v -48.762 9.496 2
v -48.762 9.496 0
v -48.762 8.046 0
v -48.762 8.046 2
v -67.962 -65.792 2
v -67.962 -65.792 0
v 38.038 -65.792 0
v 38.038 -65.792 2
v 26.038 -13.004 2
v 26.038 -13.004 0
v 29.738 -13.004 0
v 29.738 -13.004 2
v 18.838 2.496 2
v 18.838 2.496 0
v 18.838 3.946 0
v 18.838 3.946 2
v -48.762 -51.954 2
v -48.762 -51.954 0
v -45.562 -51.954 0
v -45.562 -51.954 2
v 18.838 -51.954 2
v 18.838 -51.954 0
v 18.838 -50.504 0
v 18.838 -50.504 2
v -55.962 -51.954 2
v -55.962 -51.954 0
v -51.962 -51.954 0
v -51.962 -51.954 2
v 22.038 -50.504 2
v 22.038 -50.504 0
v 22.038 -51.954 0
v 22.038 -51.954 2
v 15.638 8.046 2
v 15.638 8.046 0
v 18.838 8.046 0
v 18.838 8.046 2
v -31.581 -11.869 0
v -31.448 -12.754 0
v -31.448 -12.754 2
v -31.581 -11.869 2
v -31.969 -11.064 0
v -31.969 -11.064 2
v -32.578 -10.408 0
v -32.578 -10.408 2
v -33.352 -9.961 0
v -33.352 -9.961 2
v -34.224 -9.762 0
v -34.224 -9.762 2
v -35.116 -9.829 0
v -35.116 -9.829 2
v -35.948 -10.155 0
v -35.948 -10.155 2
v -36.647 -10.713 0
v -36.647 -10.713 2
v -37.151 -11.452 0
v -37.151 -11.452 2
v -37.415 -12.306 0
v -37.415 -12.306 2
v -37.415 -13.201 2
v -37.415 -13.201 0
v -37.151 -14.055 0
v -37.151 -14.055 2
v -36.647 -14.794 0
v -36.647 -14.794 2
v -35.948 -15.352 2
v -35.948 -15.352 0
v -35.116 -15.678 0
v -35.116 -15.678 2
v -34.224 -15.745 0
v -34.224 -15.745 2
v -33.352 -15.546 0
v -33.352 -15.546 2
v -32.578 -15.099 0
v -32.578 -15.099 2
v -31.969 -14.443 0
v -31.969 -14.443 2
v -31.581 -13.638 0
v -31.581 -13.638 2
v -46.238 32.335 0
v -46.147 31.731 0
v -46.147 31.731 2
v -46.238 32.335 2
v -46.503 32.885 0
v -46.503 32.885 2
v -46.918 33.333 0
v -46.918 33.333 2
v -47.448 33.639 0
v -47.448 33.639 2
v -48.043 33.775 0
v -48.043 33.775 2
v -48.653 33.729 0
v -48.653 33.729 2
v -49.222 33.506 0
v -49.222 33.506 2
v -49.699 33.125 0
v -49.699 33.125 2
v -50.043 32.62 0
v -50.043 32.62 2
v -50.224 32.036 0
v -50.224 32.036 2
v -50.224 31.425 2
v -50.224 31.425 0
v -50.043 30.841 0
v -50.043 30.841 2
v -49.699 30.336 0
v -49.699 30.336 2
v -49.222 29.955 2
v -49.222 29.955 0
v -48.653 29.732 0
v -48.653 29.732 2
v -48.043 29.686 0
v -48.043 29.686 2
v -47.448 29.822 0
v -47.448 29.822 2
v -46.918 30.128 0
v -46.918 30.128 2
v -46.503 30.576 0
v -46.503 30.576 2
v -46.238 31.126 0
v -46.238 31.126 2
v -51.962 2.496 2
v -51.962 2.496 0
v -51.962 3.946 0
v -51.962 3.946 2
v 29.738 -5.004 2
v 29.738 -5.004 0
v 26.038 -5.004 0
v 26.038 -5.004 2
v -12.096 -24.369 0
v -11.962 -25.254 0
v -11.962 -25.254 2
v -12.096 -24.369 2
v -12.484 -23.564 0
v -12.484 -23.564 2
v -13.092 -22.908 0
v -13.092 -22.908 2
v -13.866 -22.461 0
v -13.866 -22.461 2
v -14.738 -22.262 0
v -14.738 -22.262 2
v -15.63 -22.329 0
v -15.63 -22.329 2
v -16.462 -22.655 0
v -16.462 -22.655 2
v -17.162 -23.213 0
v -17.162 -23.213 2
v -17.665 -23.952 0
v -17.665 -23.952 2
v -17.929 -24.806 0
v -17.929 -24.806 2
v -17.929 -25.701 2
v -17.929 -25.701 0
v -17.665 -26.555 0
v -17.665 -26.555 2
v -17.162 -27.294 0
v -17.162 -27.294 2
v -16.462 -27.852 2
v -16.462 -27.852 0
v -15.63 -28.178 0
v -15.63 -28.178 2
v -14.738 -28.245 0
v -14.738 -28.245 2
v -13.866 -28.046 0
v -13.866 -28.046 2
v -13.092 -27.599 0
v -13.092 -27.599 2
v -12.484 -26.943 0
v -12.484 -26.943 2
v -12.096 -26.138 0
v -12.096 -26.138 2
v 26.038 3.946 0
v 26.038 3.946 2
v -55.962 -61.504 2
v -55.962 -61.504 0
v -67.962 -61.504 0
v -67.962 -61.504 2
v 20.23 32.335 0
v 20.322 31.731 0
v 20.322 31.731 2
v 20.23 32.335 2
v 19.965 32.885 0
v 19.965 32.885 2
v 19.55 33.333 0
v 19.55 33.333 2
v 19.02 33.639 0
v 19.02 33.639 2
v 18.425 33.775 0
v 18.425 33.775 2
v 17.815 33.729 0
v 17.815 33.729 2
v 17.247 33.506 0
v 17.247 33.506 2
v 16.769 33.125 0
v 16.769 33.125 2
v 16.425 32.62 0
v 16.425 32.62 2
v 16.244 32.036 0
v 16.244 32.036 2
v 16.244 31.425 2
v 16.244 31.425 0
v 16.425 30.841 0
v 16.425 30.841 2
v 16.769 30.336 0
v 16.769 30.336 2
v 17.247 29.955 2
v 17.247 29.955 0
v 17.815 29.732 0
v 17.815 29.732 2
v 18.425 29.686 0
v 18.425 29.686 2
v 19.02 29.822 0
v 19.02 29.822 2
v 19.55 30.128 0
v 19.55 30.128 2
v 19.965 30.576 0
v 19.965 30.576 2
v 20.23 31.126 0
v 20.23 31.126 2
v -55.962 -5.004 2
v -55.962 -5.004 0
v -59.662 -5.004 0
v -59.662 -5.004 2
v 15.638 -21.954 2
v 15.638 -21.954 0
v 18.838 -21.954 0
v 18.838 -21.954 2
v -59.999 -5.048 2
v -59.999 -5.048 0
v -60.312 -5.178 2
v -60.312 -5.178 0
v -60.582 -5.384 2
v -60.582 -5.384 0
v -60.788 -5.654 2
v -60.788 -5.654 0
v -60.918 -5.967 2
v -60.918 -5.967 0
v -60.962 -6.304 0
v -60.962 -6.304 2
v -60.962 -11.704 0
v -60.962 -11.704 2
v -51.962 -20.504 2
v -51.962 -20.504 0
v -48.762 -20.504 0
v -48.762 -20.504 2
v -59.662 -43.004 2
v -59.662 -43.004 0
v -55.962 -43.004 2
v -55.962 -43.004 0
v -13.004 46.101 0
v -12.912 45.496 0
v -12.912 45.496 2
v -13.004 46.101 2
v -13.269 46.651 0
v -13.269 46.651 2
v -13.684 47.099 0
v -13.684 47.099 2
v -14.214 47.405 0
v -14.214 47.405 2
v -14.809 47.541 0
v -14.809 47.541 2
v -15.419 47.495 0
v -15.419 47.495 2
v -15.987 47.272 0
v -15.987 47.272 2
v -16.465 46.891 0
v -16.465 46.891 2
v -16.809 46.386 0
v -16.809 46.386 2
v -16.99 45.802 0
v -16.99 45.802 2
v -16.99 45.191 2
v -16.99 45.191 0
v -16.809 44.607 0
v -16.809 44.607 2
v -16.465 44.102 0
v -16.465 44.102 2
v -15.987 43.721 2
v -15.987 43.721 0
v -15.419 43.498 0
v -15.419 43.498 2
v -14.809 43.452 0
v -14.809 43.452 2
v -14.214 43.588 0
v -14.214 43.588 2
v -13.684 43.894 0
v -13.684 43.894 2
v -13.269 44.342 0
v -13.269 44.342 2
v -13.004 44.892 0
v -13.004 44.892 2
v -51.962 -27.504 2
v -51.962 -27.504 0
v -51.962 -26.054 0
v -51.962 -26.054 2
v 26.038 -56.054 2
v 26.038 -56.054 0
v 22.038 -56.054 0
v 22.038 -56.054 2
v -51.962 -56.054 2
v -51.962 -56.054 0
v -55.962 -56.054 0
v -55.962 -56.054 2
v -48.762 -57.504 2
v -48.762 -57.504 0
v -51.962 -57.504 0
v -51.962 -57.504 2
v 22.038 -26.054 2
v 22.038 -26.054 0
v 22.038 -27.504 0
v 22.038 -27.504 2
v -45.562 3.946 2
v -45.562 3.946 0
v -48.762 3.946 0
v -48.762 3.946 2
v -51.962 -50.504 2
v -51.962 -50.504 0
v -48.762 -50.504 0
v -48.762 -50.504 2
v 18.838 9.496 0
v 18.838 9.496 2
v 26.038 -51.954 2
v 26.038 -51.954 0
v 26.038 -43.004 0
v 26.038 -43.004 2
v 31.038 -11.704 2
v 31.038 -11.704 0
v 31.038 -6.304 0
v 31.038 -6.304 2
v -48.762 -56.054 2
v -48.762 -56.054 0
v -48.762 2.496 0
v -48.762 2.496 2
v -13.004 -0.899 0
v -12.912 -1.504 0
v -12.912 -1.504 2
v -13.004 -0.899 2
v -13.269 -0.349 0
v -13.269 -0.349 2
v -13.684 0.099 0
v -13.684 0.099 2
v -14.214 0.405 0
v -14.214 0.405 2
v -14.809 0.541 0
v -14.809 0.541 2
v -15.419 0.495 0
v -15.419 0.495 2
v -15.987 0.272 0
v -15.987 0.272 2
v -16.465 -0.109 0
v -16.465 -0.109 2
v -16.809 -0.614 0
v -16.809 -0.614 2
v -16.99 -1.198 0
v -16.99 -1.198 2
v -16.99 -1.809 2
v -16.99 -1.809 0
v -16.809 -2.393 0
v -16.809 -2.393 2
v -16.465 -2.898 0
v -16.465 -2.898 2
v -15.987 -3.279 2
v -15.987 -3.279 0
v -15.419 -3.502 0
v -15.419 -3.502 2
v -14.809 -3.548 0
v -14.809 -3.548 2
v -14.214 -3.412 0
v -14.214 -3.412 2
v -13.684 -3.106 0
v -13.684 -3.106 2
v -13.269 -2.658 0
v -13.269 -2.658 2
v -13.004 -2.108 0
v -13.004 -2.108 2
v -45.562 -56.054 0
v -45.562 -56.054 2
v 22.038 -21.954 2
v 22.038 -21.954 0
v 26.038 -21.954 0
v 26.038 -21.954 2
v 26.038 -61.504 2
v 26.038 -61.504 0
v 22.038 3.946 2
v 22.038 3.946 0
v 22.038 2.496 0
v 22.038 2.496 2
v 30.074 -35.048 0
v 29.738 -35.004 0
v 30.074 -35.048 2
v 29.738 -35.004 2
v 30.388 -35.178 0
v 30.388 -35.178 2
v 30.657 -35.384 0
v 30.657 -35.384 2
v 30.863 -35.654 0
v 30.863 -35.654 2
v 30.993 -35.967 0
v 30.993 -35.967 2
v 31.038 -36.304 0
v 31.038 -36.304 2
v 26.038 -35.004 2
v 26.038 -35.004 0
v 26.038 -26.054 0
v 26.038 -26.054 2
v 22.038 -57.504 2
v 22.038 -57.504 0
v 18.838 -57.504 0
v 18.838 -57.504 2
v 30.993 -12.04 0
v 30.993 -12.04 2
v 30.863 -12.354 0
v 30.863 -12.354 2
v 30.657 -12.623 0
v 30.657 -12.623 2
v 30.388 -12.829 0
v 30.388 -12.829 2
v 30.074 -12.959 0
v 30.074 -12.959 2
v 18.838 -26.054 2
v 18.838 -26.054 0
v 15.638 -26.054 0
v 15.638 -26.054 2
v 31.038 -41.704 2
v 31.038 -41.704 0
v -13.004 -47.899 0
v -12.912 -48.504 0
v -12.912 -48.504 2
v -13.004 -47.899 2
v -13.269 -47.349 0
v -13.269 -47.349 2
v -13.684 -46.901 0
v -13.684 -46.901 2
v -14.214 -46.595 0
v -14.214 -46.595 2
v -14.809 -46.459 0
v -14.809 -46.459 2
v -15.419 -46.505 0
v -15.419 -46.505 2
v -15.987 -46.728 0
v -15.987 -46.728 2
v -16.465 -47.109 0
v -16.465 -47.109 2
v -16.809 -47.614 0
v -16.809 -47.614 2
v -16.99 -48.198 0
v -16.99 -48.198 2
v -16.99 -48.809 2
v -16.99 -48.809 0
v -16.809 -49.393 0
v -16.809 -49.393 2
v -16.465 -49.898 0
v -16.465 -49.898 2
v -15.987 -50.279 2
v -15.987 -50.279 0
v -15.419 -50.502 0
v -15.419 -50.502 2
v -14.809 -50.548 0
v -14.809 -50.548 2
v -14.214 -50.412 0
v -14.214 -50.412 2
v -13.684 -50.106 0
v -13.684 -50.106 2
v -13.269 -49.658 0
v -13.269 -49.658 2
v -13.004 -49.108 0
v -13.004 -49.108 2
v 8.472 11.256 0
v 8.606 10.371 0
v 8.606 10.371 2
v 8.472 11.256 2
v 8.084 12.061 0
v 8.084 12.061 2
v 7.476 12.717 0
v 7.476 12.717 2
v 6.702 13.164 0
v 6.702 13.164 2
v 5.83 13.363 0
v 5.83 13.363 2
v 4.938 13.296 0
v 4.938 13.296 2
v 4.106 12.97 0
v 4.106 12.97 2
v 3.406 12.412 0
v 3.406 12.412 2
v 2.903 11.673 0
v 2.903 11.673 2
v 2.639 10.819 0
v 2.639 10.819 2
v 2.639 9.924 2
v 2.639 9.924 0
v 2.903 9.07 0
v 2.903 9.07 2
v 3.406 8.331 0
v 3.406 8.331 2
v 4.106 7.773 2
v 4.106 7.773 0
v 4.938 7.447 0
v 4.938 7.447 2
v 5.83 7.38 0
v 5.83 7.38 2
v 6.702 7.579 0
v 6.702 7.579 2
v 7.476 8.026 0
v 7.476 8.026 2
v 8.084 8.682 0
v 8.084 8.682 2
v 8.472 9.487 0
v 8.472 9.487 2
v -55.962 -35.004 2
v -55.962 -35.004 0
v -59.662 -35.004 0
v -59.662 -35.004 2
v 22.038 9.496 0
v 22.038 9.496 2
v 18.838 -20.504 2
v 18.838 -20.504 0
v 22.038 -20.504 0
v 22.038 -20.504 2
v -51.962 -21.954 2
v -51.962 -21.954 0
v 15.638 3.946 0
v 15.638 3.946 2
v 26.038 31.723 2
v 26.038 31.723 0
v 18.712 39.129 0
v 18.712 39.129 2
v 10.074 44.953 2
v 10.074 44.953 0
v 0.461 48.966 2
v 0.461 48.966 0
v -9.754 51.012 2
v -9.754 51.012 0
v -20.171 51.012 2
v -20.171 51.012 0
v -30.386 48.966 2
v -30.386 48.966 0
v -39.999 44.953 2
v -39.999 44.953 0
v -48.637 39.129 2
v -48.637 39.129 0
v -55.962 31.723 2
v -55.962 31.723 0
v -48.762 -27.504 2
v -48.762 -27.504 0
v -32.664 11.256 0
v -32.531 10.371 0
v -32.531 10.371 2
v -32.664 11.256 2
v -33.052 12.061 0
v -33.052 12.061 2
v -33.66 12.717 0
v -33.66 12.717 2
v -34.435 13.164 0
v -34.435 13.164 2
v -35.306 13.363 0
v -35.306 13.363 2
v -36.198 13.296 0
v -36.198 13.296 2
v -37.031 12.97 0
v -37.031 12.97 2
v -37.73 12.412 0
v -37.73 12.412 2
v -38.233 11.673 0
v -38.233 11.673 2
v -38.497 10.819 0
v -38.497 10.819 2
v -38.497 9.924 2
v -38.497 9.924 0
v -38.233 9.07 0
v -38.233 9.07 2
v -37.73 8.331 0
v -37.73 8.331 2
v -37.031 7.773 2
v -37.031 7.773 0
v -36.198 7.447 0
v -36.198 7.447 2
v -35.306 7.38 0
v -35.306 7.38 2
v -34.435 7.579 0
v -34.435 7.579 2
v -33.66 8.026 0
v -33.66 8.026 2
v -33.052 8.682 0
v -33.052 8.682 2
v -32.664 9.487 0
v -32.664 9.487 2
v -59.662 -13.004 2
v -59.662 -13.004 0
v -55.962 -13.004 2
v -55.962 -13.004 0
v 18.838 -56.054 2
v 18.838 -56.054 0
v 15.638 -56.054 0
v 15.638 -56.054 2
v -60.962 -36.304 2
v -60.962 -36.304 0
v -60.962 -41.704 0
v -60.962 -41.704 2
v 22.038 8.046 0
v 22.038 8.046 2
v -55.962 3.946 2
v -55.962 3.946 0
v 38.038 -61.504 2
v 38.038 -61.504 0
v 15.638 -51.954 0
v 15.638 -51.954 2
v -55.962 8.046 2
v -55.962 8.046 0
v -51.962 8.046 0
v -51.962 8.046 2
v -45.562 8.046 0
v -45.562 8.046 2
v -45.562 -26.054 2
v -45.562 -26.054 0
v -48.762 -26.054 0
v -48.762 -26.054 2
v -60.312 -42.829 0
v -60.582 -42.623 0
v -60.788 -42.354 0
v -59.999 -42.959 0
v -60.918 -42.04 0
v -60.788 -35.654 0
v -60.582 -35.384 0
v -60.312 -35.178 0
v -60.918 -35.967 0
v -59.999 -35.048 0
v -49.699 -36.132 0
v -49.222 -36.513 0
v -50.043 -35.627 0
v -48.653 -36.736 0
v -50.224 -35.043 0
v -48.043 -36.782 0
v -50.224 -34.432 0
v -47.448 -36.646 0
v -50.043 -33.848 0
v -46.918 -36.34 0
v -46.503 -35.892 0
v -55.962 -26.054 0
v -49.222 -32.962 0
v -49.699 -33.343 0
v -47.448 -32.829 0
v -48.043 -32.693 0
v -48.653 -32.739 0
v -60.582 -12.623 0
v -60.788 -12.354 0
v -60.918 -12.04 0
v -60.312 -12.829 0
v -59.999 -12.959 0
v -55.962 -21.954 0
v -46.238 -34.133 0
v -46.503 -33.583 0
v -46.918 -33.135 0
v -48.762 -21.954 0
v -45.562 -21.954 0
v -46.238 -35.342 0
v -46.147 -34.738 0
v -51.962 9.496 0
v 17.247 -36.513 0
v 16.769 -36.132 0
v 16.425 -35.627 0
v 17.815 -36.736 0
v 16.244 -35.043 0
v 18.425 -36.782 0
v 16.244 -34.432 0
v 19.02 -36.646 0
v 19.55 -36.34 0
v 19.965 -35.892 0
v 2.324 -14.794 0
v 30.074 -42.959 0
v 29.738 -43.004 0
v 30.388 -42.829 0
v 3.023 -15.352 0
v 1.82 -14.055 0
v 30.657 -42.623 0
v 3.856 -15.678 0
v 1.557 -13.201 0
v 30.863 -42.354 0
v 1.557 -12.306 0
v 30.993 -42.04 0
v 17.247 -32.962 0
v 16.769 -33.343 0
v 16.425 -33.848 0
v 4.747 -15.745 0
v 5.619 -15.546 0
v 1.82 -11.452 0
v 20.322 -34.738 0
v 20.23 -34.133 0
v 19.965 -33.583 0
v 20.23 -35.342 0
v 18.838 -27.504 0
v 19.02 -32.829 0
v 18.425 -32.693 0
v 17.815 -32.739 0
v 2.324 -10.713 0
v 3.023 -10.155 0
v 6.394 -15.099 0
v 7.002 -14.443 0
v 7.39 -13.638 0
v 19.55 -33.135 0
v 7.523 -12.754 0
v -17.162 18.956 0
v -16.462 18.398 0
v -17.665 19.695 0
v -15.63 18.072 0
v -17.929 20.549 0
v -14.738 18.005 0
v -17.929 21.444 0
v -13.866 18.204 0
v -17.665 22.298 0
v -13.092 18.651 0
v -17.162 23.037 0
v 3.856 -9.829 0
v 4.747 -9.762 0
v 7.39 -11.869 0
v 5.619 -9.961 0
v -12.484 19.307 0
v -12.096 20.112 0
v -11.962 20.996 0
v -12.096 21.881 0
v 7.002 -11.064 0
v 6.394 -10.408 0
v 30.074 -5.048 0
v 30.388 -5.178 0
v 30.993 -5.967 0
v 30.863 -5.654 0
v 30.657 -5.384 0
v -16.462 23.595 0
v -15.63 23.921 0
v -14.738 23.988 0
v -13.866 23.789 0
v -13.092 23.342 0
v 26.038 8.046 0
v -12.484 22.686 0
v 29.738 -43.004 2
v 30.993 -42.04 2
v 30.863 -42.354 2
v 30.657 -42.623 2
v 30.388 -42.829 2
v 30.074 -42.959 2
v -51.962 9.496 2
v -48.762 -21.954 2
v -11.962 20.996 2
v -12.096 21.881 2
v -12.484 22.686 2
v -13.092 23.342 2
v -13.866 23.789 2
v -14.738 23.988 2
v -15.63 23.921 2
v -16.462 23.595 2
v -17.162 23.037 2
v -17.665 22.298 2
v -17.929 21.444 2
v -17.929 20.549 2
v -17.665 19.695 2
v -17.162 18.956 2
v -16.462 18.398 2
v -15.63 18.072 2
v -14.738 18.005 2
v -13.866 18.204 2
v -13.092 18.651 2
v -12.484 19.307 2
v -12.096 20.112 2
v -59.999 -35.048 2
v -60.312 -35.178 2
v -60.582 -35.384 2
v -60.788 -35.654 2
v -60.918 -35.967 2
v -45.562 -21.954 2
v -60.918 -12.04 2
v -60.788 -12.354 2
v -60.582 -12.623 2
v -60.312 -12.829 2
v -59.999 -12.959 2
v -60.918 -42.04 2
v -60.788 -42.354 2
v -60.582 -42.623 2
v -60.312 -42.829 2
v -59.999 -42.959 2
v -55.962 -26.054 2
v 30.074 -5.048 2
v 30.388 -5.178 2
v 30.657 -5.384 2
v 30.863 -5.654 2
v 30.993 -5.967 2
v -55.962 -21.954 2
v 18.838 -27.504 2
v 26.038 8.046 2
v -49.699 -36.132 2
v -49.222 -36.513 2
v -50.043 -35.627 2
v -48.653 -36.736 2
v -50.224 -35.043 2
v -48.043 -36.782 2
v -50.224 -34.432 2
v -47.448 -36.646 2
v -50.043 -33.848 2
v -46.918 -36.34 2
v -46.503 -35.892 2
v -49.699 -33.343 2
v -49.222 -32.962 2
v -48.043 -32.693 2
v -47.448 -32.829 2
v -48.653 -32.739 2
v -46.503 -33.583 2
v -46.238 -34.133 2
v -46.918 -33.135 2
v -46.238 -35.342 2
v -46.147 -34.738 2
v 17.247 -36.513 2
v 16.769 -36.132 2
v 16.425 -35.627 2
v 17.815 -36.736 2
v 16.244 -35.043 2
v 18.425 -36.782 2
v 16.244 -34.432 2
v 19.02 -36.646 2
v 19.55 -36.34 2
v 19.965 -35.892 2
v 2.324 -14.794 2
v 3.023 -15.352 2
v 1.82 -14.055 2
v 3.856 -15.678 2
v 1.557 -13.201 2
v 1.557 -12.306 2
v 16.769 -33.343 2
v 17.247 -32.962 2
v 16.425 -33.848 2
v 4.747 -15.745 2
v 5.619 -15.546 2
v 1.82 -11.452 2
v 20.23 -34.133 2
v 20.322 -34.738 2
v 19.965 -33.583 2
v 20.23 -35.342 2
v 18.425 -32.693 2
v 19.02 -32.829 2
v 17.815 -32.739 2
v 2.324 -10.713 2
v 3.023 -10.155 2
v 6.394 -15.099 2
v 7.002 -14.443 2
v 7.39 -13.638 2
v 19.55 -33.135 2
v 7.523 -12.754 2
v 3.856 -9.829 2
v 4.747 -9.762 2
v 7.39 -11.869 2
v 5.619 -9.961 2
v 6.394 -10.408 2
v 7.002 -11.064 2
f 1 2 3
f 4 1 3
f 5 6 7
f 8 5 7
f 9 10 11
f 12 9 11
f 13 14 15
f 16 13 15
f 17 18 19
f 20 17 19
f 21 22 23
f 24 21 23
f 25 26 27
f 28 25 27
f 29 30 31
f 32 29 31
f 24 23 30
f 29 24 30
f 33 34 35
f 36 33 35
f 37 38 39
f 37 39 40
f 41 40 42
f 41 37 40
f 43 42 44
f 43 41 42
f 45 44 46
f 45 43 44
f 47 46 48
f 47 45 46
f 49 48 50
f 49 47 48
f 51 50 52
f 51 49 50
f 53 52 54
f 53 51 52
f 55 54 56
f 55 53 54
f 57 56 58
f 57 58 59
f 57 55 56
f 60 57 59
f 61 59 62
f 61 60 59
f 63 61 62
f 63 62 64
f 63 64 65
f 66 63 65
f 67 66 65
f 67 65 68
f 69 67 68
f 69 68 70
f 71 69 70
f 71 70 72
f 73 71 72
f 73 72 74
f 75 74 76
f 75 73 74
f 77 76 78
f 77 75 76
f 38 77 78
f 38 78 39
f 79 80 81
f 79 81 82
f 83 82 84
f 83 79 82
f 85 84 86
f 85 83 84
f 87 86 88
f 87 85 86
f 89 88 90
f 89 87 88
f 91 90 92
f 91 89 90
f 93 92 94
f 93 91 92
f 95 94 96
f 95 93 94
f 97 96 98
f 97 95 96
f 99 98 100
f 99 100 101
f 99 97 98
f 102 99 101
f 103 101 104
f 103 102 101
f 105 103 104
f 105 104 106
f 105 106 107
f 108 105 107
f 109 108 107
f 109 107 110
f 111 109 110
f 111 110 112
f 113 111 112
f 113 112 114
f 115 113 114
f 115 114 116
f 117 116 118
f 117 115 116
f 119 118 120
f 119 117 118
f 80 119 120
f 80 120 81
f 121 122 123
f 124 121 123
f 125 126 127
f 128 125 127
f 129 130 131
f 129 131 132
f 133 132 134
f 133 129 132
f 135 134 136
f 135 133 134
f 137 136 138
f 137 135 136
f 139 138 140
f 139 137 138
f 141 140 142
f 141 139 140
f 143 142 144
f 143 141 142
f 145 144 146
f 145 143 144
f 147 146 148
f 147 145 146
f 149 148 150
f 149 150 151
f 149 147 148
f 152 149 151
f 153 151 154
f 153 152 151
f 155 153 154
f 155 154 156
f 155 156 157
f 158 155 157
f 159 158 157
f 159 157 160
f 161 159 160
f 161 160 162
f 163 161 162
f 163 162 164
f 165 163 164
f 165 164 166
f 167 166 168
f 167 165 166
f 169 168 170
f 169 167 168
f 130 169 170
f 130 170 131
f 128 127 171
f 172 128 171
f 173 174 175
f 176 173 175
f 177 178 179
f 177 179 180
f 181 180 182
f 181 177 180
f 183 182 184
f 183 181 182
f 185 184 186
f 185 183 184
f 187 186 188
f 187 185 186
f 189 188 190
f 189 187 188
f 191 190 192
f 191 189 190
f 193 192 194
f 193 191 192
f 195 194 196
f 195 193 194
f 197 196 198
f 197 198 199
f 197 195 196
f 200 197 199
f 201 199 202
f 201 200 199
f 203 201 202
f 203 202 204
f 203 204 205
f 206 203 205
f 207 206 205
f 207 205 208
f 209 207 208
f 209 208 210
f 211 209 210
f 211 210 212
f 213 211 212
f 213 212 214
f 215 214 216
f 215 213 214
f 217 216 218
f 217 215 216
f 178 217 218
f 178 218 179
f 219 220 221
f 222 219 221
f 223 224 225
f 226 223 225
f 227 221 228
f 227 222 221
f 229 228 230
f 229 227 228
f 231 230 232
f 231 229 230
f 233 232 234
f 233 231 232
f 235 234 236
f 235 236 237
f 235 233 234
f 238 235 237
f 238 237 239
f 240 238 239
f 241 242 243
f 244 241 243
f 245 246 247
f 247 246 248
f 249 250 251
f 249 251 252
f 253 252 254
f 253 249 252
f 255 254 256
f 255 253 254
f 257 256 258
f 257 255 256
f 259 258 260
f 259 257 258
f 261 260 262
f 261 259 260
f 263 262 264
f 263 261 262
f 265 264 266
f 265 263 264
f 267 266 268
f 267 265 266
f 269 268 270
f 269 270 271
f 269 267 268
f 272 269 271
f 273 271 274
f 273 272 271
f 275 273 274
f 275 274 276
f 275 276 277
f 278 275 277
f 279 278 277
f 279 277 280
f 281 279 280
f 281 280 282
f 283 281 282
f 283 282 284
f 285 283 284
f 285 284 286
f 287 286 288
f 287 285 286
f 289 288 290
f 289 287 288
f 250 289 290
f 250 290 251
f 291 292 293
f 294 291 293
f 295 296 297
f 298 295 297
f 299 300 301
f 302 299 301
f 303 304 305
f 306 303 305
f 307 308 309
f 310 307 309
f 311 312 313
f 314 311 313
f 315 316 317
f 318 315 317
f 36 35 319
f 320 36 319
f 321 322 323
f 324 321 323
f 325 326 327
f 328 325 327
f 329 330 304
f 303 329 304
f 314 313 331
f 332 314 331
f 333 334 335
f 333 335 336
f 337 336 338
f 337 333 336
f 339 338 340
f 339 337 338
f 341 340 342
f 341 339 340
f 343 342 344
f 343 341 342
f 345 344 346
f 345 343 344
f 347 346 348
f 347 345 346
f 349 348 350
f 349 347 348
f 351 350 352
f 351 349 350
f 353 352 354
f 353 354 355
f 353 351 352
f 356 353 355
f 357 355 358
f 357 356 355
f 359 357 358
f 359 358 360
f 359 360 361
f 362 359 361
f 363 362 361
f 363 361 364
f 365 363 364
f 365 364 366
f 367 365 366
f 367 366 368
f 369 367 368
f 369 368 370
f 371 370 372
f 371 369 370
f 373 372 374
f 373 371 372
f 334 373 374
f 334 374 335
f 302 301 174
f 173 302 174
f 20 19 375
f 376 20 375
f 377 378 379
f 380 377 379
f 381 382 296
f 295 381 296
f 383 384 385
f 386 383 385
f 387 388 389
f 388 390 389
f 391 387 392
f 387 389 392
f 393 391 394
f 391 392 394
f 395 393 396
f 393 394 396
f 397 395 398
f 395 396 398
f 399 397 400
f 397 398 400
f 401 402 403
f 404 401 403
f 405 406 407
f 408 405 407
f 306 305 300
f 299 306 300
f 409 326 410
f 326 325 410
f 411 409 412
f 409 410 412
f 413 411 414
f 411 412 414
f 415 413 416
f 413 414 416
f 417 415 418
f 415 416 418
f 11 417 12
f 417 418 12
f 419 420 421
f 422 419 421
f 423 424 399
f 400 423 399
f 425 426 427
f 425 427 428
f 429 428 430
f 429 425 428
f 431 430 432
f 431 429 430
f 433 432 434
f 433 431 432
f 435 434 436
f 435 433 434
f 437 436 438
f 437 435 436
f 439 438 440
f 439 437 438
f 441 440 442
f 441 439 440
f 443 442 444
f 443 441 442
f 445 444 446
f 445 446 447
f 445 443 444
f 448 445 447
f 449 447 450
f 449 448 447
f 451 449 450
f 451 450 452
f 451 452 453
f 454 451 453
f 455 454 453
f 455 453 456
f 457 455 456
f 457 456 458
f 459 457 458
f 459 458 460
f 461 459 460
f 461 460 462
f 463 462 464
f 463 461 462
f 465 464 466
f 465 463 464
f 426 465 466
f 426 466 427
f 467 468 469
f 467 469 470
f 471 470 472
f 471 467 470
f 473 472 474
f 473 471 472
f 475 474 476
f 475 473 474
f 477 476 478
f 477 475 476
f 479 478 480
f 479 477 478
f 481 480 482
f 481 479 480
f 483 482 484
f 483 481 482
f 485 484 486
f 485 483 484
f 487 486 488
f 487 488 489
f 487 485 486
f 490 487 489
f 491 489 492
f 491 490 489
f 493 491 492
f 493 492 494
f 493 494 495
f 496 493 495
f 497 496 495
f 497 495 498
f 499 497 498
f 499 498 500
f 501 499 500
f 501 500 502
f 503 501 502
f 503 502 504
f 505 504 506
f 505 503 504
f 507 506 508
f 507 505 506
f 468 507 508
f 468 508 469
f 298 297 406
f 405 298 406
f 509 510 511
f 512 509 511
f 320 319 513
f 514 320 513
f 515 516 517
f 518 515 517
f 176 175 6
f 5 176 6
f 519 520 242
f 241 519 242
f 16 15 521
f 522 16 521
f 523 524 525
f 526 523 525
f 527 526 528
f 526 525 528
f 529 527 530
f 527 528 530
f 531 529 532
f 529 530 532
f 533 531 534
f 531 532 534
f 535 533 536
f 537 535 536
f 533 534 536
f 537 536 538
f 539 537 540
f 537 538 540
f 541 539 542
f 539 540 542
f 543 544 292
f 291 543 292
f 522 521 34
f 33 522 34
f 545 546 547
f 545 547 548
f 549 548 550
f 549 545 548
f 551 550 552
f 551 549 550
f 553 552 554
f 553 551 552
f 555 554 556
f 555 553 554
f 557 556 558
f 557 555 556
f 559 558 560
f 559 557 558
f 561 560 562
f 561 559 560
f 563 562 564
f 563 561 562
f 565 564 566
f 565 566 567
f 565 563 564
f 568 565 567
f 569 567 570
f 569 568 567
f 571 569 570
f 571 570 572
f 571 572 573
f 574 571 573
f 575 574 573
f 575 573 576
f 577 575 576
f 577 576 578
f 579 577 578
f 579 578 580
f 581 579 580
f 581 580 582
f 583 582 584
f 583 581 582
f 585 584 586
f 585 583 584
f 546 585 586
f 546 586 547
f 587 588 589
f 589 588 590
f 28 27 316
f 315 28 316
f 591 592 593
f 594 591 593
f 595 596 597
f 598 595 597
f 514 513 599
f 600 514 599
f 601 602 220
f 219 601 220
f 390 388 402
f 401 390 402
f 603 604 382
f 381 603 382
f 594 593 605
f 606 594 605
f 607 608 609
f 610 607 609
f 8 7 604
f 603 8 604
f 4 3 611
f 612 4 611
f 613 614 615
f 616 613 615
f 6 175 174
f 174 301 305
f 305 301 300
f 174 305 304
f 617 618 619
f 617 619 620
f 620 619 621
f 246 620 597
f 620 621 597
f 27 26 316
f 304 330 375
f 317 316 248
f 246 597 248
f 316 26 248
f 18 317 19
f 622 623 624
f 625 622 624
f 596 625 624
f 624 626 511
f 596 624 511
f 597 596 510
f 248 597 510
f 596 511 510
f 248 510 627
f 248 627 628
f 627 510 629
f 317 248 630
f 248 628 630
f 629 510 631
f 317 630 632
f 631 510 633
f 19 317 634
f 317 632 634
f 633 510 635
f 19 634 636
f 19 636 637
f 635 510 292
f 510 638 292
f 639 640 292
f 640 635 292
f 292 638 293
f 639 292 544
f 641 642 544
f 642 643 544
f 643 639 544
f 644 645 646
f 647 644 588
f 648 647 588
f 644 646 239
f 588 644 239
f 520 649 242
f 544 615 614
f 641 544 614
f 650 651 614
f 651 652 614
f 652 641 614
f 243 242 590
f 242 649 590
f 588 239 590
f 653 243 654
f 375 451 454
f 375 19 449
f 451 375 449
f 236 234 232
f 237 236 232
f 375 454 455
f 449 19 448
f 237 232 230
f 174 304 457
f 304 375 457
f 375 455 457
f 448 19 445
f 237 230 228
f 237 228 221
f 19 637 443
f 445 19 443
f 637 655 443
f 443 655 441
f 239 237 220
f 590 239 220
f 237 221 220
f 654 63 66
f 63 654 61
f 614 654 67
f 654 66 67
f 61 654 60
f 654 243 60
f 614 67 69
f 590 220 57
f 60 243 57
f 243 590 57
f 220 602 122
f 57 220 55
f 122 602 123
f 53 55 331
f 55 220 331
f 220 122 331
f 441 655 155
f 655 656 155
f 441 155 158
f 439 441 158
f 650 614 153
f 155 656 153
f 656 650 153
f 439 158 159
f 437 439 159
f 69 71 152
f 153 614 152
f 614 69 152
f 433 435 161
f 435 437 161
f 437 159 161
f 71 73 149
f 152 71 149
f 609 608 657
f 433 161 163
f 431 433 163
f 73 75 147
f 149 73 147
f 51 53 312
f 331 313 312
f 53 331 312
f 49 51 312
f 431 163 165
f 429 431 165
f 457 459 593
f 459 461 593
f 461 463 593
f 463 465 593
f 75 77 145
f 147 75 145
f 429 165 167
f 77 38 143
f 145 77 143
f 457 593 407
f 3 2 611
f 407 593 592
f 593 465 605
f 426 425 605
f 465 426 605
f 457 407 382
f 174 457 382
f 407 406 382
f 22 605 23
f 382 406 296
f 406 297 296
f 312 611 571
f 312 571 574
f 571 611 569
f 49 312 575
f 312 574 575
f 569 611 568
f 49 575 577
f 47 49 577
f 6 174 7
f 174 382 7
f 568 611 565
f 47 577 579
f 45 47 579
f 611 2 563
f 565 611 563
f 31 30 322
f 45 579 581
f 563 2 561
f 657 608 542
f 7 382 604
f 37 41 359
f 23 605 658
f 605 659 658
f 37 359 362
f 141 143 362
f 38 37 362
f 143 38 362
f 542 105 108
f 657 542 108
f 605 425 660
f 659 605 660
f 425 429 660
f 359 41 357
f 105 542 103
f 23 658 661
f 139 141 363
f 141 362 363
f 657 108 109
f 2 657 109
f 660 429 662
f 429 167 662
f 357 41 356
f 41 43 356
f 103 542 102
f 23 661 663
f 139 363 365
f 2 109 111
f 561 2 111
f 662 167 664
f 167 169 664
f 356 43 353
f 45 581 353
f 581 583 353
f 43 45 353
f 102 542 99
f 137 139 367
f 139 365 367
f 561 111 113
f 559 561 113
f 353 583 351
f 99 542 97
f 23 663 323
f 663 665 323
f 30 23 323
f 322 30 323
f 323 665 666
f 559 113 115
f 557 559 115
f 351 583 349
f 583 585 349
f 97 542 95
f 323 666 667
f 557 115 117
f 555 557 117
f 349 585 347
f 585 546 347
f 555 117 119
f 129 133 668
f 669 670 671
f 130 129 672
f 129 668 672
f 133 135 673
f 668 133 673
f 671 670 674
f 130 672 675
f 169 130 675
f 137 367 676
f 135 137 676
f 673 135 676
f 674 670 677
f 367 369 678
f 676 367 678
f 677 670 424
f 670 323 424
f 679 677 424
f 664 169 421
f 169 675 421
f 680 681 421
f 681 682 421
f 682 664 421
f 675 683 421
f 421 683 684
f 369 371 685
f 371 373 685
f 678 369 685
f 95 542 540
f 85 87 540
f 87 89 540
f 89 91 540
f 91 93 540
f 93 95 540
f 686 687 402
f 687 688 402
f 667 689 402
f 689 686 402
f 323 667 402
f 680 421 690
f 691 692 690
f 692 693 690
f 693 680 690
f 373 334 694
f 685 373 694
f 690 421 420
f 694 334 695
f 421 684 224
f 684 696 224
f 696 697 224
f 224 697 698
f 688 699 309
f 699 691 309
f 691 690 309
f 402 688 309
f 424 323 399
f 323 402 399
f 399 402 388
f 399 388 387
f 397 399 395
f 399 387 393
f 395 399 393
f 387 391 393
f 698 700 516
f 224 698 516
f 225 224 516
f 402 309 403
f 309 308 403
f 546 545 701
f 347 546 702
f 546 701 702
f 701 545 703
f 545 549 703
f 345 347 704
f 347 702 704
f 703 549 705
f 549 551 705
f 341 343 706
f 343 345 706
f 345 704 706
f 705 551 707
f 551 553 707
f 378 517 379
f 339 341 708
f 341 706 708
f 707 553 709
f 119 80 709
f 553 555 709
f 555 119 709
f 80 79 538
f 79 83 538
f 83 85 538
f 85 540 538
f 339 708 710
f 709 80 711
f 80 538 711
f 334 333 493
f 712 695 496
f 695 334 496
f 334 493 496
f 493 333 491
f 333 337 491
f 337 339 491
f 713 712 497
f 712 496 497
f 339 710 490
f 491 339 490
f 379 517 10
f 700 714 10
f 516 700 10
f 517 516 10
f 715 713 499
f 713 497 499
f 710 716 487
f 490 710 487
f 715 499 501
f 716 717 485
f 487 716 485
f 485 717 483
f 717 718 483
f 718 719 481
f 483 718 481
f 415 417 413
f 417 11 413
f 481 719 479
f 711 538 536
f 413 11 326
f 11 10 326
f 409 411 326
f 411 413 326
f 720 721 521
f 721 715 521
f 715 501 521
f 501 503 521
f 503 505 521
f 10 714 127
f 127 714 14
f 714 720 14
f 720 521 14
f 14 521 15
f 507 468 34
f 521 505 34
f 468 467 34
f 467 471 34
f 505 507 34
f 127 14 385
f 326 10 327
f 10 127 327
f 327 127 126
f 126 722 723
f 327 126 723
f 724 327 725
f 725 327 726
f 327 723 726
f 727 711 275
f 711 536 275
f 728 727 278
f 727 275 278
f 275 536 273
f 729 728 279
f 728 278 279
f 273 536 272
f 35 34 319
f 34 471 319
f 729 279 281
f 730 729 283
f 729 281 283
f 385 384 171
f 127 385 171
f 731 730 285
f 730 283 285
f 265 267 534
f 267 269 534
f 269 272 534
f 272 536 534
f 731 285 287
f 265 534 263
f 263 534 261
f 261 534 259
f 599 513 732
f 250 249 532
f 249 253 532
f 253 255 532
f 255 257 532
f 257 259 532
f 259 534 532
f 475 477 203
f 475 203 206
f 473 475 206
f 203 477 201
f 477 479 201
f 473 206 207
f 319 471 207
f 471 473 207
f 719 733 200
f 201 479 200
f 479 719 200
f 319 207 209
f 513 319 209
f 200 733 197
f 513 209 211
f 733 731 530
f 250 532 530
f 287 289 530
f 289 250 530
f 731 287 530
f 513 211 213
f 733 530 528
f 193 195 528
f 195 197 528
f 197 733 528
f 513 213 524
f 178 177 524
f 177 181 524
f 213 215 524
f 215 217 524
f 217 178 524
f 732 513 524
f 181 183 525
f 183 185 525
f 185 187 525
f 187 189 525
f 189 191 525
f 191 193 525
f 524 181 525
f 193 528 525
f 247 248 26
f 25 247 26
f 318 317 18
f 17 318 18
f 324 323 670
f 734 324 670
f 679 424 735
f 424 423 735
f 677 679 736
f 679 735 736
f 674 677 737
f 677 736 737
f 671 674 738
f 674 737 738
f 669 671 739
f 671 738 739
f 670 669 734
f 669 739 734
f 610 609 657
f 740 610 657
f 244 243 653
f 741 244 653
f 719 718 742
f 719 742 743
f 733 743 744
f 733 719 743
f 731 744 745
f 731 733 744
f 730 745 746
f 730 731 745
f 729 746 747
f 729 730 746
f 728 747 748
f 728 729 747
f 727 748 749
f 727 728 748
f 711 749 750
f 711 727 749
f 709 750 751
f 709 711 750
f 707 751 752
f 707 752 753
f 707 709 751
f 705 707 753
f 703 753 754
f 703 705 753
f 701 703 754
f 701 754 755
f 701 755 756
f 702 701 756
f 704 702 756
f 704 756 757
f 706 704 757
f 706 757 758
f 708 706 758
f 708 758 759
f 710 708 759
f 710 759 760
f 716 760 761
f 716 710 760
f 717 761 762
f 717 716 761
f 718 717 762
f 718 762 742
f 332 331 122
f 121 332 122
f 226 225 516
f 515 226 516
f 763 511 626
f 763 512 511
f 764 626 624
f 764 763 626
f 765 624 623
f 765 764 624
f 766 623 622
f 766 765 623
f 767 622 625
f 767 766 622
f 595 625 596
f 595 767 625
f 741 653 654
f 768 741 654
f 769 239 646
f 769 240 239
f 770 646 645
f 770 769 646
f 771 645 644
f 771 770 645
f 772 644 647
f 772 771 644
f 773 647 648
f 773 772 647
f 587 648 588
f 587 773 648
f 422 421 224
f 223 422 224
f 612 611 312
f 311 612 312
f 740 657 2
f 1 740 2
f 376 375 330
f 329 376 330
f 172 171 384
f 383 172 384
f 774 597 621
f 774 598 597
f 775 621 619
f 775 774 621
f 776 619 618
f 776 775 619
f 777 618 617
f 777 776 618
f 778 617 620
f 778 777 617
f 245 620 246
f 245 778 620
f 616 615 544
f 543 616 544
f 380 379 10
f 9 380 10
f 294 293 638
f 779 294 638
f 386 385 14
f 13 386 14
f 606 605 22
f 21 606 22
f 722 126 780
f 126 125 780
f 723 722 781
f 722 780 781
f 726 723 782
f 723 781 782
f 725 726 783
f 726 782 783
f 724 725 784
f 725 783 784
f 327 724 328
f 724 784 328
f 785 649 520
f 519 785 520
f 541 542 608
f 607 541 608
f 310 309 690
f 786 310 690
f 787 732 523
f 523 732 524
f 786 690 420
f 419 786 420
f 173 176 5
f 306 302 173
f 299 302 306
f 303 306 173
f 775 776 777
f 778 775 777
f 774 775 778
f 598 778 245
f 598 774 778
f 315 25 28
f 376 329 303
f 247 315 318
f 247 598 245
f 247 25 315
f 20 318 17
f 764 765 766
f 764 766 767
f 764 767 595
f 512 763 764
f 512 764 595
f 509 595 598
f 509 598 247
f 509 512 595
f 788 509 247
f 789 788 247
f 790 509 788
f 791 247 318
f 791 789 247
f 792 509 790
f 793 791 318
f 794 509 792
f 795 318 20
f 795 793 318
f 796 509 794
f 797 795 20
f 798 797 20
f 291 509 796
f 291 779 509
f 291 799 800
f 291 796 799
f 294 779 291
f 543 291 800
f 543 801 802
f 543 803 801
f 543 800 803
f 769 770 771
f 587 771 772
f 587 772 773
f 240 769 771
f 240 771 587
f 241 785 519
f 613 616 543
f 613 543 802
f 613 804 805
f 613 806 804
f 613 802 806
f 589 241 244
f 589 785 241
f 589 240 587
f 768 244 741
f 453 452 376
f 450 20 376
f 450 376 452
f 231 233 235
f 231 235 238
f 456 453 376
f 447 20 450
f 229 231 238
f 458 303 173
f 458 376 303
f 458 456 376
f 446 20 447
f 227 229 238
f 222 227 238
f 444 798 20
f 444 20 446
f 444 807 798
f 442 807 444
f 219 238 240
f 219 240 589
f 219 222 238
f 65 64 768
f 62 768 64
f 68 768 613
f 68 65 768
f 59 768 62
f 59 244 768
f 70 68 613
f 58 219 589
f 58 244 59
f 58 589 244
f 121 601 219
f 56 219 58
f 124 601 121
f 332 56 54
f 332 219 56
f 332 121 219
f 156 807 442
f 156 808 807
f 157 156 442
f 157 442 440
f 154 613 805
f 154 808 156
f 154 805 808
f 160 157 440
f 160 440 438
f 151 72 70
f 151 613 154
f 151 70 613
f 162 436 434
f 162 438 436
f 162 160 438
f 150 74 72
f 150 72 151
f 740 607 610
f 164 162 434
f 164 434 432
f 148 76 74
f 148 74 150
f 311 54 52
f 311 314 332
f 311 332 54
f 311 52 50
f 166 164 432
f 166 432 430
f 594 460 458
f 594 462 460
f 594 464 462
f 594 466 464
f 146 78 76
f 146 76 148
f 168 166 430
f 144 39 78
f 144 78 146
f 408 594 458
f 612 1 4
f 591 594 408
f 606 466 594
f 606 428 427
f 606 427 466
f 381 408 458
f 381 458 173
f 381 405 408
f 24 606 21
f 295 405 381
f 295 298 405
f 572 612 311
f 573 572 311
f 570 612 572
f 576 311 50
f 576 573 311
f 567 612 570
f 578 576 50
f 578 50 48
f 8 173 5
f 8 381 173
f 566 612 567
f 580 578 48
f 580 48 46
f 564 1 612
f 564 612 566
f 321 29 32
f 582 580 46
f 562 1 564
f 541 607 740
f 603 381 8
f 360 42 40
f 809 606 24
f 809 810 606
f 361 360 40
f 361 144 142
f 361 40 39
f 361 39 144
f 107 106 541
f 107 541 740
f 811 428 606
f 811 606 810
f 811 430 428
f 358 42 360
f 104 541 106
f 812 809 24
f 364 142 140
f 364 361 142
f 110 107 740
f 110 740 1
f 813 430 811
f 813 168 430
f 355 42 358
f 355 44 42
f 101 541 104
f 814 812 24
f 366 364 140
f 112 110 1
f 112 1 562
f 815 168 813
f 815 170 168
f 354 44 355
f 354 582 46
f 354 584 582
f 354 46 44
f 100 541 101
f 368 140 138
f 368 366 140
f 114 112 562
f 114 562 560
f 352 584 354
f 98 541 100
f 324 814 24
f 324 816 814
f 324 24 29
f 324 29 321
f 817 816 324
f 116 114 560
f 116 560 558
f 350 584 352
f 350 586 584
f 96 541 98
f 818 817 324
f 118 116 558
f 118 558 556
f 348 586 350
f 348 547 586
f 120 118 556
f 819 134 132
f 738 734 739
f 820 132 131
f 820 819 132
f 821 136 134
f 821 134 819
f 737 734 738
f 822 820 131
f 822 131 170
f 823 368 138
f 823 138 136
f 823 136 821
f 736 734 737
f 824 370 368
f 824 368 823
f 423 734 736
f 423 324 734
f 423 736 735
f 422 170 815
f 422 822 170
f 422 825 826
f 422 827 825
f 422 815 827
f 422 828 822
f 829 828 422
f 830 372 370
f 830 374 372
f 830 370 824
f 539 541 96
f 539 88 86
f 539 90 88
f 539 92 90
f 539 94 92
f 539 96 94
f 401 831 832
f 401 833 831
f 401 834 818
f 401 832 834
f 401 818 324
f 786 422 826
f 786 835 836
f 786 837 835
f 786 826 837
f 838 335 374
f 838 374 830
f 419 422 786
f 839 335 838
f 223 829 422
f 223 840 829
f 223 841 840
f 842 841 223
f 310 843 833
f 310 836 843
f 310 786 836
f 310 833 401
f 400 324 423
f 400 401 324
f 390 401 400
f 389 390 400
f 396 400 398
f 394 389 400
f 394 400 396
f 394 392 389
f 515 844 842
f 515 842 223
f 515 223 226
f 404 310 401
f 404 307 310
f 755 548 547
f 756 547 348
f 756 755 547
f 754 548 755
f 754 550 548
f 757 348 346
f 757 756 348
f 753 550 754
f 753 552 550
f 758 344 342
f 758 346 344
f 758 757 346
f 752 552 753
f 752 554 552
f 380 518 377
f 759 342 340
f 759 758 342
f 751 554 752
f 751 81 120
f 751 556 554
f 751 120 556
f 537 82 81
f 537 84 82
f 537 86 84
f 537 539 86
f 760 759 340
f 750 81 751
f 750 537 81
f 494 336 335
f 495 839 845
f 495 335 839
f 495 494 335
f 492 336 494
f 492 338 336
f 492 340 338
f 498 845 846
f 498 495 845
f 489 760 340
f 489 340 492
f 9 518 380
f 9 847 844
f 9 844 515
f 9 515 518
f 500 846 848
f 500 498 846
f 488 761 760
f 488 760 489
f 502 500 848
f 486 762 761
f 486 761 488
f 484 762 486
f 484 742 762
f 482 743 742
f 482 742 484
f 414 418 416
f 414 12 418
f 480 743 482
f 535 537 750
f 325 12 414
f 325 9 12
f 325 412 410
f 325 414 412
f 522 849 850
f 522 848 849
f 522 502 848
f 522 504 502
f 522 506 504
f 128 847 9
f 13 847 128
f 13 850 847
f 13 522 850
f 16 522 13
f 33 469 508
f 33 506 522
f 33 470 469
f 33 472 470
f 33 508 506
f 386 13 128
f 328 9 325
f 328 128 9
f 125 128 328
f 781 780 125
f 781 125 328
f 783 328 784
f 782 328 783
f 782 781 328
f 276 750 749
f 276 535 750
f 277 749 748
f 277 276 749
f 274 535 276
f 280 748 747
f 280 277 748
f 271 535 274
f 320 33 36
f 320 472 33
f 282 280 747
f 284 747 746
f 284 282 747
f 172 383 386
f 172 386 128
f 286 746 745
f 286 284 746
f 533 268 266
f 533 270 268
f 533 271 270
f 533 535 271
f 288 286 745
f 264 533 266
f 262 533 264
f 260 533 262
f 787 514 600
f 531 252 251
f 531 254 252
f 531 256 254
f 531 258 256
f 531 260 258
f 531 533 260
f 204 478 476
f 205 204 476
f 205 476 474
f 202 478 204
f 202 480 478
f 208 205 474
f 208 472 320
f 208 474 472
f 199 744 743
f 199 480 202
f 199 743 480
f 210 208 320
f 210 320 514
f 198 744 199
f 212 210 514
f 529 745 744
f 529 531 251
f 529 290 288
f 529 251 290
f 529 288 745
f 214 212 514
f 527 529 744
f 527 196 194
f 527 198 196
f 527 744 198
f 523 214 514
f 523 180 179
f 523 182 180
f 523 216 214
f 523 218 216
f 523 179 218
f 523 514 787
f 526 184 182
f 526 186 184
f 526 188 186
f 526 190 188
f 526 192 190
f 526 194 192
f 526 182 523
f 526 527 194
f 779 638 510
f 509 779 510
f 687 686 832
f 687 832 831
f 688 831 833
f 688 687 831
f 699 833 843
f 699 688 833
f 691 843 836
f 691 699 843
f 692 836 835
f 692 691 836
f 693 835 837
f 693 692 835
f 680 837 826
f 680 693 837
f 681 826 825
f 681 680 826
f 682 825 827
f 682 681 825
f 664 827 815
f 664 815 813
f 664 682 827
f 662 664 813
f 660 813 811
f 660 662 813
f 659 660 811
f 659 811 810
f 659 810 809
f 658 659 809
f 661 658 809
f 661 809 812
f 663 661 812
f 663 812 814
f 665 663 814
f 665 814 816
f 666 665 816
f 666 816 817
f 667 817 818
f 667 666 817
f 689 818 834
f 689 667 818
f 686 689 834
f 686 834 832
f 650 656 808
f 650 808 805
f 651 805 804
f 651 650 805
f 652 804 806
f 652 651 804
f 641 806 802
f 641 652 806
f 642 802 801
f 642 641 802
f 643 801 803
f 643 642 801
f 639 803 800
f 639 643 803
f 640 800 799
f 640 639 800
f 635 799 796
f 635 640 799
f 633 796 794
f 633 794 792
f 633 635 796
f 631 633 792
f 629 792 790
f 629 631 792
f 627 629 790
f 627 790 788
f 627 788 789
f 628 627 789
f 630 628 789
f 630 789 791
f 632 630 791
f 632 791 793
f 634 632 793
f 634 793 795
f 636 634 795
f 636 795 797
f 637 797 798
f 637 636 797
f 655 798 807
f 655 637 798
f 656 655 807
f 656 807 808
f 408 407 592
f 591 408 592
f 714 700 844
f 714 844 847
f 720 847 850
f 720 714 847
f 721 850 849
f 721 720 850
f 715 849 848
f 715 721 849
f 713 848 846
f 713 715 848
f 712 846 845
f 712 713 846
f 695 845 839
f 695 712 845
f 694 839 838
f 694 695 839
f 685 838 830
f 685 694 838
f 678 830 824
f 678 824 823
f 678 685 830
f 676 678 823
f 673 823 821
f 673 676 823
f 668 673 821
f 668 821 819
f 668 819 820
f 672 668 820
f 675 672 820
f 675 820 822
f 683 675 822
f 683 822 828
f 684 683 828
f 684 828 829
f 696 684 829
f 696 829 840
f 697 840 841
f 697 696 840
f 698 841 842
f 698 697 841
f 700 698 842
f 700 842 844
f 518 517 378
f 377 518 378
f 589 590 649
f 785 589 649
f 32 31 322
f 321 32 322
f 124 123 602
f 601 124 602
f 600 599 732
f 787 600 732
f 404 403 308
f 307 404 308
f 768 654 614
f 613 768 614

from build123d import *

# Parameters (mm, degrees)
SKETCH_1_R      = 3
SKETCH_1_R_2    = 2.05
EXTRUDE_2_DEPTH = 2
FILLET_1_R      = 1.3


with BuildPart() as part:
    # 草图1 → 凸台-拉伸2 (new body)
    with BuildSketch(Plane.XY):
        with BuildLine():
            Line((-55.962487977, 23.496493589), (-55.962487977, 8.046493589))
            Line((-55.962487977, 8.046493589), (-51.962487977, 8.046493589))
            Line((-51.962487977, 8.046493589), (-51.962487977, 9.496493589))
            Line((-51.962487977, 9.496493589), (-48.762487977, 9.496493589))
            Line((-48.762487977, 9.496493589), (-48.762487977, 8.046493589))
            Line((-48.762487977, 8.046493589), (-45.562487977, 8.046493589))
            Line((-45.562487977, 8.046493589), (-45.562487977, 3.946493589))
            Line((-45.562487977, 3.946493589), (-48.762487977, 3.946493589))
            Line((-48.762487977, 3.946493589), (-48.762487977, 2.496493589))
            Line((-48.762487977, 2.496493589), (-51.962487977, 2.496493589))
            Line((-51.962487977, 2.496493589), (-51.962487977, 3.946493589))
            Line((-51.962487977, 3.946493589), (-55.962487977, 3.946493589))
            Line((-55.962487977, 3.946493589), (-55.962487977, -5.003506411))
            Line((-55.962487977, -5.003506411), (-60.962487977, -5.003506411))
            Line((-60.962487977, -5.003506411), (-60.962487977, -13.003506411))
            Line((-60.962487977, -13.003506411), (-55.962487977, -13.003506411))
            Line((-55.962487977, -13.003506411), (-55.962487977, -21.953506411))
            Line((-55.962487977, -21.953506411), (-51.962487977, -21.953506411))
            Line((-51.962487977, -21.953506411), (-51.962487977, -20.503506411))
            Line((-51.962487977, -20.503506411), (-48.762487977, -20.503506411))
            Line((-48.762487977, -20.503506411), (-48.762487977, -21.953506411))
            Line((-48.762487977, -21.953506411), (-45.562487977, -21.953506411))
            Line((-45.562487977, -21.953506411), (-45.562487977, -26.053506411))
            Line((-45.562487977, -26.053506411), (-48.762487977, -26.053506411))
            Line((-48.762487977, -26.053506411), (-48.762487977, -27.503506411))
            Line((-48.762487977, -27.503506411), (-51.962487977, -27.503506411))
            Line((-51.962487977, -27.503506411), (-51.962487977, -26.053506411))
            Line((-51.962487977, -26.053506411), (-55.962487977, -26.053506411))
            Line((-55.962487977, -26.053506411), (-55.962487977, -35.003506411))
            Line((-55.962487977, -35.003506411), (-60.962487977, -35.003506411))
            Line((-60.962487977, -35.003506411), (-60.962487977, -43.003506411))
            Line((-60.962487977, -43.003506411), (-55.962487977, -43.003506411))
            Line((-55.962487977, -43.003506411), (-55.962487977, -51.953506411))
            Line((-55.962487977, -51.953506411), (-51.962487977, -51.953506411))
            Line((-51.962487977, -51.953506411), (-51.962487977, -50.503506411))
            Line((-51.962487977, -50.503506411), (-48.762487977, -50.503506411))
            Line((-48.762487977, -50.503506411), (-48.762487977, -51.953506411))
            Line((-48.762487977, -51.953506411), (-45.562487977, -51.953506411))
            Line((-45.562487977, -51.953506411), (-45.562487977, -56.053506411))
            Line((-45.562487977, -56.053506411), (-48.762487977, -56.053506411))
            Line((-48.762487977, -56.053506411), (-48.762487977, -57.503506411))
            Line((-48.762487977, -57.503506411), (-51.962487977, -57.503506411))
            Line((-51.962487977, -57.503506411), (-51.962487977, -56.053506411))
            Line((-51.962487977, -56.053506411), (-55.962487977, -56.053506411))
            Line((-55.962487977, -56.053506411), (-55.962487977, -61.503506411))
            Line((-55.962487977, -61.503506411), (-67.962487977, -61.503506411))
            Line((-67.962487977, -61.503506411), (-67.962487977, -65.791888255))
            Line((-67.962487977, -65.791888255), (38.037512023, -65.791888255))
            Line((38.037512023, -65.791888255), (38.037512023, -61.503506411))
            Line((38.037512023, -61.503506411), (26.037512023, -61.503506411))
            Line((26.037512023, -61.503506411), (26.037512023, -56.053506411))
            Line((26.037512023, -56.053506411), (22.037512023, -56.053506411))
            Line((22.037512023, -56.053506411), (22.037512023, -57.503506411))
            Line((22.037512023, -57.503506411), (18.837512023, -57.503506411))
            Line((18.837512023, -57.503506411), (18.837512023, -56.053506411))
            Line((18.837512023, -56.053506411), (15.637512023, -56.053506411))
            Line((15.637512023, -56.053506411), (15.637512023, -51.953506411))
            Line((15.637512023, -51.953506411), (18.837512023, -51.953506411))
            Line((18.837512023, -51.953506411), (18.837512023, -50.503506411))
            Line((18.837512023, -50.503506411), (22.037512023, -50.503506411))
            Line((22.037512023, -50.503506411), (22.037512023, -51.953506411))
            Line((22.037512023, -51.953506411), (26.037512023, -51.953506411))
            Line((26.037512023, -51.953506411), (26.037512023, -43.003506411))
            Line((26.037512023, -43.003506411), (31.037512023, -43.003506411))
            Line((31.037512023, -43.003506411), (31.037512023, -35.003506411))
            Line((31.037512023, -35.003506411), (26.037512023, -35.003506411))
            Line((26.037512023, -35.003506411), (26.037512023, -26.053506411))
            Line((26.037512023, -26.053506411), (22.037512023, -26.053506411))
            Line((22.037512023, -26.053506411), (22.037512023, -27.503506411))
            Line((22.037512023, -27.503506411), (18.837512023, -27.503506411))
            Line((18.837512023, -27.503506411), (18.837512023, -26.053506411))
            Line((18.837512023, -26.053506411), (15.637512023, -26.053506411))
            Line((15.637512023, -26.053506411), (15.637512023, -21.953506411))
            Line((15.637512023, -21.953506411), (18.837512023, -21.953506411))
            Line((18.837512023, -21.953506411), (18.837512023, -20.503506411))
            Line((18.837512023, -20.503506411), (22.037512023, -20.503506411))
            Line((22.037512023, -20.503506411), (22.037512023, -21.953506411))
            Line((22.037512023, -21.953506411), (26.037512023, -21.953506411))
            Line((26.037512023, -21.953506411), (26.037512023, -13.003506411))
            Line((26.037512023, -13.003506411), (31.037512023, -13.003506411))
            Line((31.037512023, -13.003506411), (31.037512023, -5.003506411))
            Line((31.037512023, -5.003506411), (26.037512023, -5.003506411))
            Line((26.037512023, -5.003506411), (26.037512023, 3.946493589))
            Line((26.037512023, 3.946493589), (22.037512023, 3.946493589))
            Line((22.037512023, 3.946493589), (22.037512023, 2.496493589))
            Line((22.037512023, 2.496493589), (18.837512023, 2.496493589))
            Line((18.837512023, 2.496493589), (18.837512023, 3.946493589))
            Line((18.837512023, 3.946493589), (15.637512023, 3.946493589))
            Line((15.637512023, 3.946493589), (15.637512023, 8.046493589))
            Line((15.637512023, 8.046493589), (18.837512023, 8.046493589))
            Line((18.837512023, 8.046493589), (18.837512023, 9.496493589))
            Line((18.837512023, 9.496493589), (22.037512023, 9.496493589))
            Line((22.037512023, 9.496493589), (22.037512023, 8.046493589))
            Line((22.037512023, 8.046493589), (26.037512023, 8.046493589))
            Line((26.037512023, 8.046493589), (26.037512023, 23.496493589))
            Line((26.037512023, 23.496493589), (26.037512023, 31.722989041))
            ThreePointArc((26.037512023, 31.722989041), (-14.962487977, 51.269592797), (-55.962487977, 31.722989041))
            Line((-55.962487977, 31.722989041), (-55.962487977, 23.496493589))
        make_face()
        with Locations((-14.962487977, -25.253506411)):
            Circle(SKETCH_1_R, mode=Mode.SUBTRACT)
        with Locations((4.523083608, -12.753506411)):
            Circle(SKETCH_1_R, mode=Mode.SUBTRACT)
        with Locations((-14.962487977, -1.503506411)):
            Circle(SKETCH_1_R_2, mode=Mode.SUBTRACT)
        with Locations((-35.530591317, 10.371493589)):
            Circle(SKETCH_1_R, mode=Mode.SUBTRACT)
        with Locations((-34.448059562, -12.753506411)):
            Circle(SKETCH_1_R, mode=Mode.SUBTRACT)
        with Locations((5.605615363, 10.371493589)):
            Circle(SKETCH_1_R, mode=Mode.SUBTRACT)
        with Locations((-14.962487977, 20.996493589)):
            Circle(SKETCH_1_R, mode=Mode.SUBTRACT)
        with Locations((18.271530739, -34.737525127)):
            Circle(SKETCH_1_R_2, mode=Mode.SUBTRACT)
        with Locations((-14.962487977, -48.503506411)):
            Circle(SKETCH_1_R_2, mode=Mode.SUBTRACT)
        with Locations((-48.196506692, -34.737525127)):
            Circle(SKETCH_1_R_2, mode=Mode.SUBTRACT)
        with Locations((-48.196506692, 31.730512305)):
            Circle(SKETCH_1_R_2, mode=Mode.SUBTRACT)
        with Locations((-14.962487977, 45.496493589)):
            Circle(SKETCH_1_R_2, mode=Mode.SUBTRACT)
        with Locations((18.271530739, 31.730512305)):
            Circle(SKETCH_1_R_2, mode=Mode.SUBTRACT)
    extrude(amount=EXTRUDE_2_DEPTH)

    # 圆角1
    fillet_1_edges = [part.edges().sort_by_distance(p)[0] for p in [
        (-60.962487977, -43.003506411, 1),
        (-60.962487977, -35.003506411, 1),
        (-60.962487977, -13.003506411, 1),
        (-60.962487977, -5.003506411, 1),
        (31.037512023, -5.003506411, 1),
        (31.037512023, -13.003506411, 1),
        (31.037512023, -35.003506411, 1),
        (31.037512023, -43.003506411, 1),
    ]]
    fillet(fillet_1_edges, radius=FILLET_1_R)


solid = part.part
